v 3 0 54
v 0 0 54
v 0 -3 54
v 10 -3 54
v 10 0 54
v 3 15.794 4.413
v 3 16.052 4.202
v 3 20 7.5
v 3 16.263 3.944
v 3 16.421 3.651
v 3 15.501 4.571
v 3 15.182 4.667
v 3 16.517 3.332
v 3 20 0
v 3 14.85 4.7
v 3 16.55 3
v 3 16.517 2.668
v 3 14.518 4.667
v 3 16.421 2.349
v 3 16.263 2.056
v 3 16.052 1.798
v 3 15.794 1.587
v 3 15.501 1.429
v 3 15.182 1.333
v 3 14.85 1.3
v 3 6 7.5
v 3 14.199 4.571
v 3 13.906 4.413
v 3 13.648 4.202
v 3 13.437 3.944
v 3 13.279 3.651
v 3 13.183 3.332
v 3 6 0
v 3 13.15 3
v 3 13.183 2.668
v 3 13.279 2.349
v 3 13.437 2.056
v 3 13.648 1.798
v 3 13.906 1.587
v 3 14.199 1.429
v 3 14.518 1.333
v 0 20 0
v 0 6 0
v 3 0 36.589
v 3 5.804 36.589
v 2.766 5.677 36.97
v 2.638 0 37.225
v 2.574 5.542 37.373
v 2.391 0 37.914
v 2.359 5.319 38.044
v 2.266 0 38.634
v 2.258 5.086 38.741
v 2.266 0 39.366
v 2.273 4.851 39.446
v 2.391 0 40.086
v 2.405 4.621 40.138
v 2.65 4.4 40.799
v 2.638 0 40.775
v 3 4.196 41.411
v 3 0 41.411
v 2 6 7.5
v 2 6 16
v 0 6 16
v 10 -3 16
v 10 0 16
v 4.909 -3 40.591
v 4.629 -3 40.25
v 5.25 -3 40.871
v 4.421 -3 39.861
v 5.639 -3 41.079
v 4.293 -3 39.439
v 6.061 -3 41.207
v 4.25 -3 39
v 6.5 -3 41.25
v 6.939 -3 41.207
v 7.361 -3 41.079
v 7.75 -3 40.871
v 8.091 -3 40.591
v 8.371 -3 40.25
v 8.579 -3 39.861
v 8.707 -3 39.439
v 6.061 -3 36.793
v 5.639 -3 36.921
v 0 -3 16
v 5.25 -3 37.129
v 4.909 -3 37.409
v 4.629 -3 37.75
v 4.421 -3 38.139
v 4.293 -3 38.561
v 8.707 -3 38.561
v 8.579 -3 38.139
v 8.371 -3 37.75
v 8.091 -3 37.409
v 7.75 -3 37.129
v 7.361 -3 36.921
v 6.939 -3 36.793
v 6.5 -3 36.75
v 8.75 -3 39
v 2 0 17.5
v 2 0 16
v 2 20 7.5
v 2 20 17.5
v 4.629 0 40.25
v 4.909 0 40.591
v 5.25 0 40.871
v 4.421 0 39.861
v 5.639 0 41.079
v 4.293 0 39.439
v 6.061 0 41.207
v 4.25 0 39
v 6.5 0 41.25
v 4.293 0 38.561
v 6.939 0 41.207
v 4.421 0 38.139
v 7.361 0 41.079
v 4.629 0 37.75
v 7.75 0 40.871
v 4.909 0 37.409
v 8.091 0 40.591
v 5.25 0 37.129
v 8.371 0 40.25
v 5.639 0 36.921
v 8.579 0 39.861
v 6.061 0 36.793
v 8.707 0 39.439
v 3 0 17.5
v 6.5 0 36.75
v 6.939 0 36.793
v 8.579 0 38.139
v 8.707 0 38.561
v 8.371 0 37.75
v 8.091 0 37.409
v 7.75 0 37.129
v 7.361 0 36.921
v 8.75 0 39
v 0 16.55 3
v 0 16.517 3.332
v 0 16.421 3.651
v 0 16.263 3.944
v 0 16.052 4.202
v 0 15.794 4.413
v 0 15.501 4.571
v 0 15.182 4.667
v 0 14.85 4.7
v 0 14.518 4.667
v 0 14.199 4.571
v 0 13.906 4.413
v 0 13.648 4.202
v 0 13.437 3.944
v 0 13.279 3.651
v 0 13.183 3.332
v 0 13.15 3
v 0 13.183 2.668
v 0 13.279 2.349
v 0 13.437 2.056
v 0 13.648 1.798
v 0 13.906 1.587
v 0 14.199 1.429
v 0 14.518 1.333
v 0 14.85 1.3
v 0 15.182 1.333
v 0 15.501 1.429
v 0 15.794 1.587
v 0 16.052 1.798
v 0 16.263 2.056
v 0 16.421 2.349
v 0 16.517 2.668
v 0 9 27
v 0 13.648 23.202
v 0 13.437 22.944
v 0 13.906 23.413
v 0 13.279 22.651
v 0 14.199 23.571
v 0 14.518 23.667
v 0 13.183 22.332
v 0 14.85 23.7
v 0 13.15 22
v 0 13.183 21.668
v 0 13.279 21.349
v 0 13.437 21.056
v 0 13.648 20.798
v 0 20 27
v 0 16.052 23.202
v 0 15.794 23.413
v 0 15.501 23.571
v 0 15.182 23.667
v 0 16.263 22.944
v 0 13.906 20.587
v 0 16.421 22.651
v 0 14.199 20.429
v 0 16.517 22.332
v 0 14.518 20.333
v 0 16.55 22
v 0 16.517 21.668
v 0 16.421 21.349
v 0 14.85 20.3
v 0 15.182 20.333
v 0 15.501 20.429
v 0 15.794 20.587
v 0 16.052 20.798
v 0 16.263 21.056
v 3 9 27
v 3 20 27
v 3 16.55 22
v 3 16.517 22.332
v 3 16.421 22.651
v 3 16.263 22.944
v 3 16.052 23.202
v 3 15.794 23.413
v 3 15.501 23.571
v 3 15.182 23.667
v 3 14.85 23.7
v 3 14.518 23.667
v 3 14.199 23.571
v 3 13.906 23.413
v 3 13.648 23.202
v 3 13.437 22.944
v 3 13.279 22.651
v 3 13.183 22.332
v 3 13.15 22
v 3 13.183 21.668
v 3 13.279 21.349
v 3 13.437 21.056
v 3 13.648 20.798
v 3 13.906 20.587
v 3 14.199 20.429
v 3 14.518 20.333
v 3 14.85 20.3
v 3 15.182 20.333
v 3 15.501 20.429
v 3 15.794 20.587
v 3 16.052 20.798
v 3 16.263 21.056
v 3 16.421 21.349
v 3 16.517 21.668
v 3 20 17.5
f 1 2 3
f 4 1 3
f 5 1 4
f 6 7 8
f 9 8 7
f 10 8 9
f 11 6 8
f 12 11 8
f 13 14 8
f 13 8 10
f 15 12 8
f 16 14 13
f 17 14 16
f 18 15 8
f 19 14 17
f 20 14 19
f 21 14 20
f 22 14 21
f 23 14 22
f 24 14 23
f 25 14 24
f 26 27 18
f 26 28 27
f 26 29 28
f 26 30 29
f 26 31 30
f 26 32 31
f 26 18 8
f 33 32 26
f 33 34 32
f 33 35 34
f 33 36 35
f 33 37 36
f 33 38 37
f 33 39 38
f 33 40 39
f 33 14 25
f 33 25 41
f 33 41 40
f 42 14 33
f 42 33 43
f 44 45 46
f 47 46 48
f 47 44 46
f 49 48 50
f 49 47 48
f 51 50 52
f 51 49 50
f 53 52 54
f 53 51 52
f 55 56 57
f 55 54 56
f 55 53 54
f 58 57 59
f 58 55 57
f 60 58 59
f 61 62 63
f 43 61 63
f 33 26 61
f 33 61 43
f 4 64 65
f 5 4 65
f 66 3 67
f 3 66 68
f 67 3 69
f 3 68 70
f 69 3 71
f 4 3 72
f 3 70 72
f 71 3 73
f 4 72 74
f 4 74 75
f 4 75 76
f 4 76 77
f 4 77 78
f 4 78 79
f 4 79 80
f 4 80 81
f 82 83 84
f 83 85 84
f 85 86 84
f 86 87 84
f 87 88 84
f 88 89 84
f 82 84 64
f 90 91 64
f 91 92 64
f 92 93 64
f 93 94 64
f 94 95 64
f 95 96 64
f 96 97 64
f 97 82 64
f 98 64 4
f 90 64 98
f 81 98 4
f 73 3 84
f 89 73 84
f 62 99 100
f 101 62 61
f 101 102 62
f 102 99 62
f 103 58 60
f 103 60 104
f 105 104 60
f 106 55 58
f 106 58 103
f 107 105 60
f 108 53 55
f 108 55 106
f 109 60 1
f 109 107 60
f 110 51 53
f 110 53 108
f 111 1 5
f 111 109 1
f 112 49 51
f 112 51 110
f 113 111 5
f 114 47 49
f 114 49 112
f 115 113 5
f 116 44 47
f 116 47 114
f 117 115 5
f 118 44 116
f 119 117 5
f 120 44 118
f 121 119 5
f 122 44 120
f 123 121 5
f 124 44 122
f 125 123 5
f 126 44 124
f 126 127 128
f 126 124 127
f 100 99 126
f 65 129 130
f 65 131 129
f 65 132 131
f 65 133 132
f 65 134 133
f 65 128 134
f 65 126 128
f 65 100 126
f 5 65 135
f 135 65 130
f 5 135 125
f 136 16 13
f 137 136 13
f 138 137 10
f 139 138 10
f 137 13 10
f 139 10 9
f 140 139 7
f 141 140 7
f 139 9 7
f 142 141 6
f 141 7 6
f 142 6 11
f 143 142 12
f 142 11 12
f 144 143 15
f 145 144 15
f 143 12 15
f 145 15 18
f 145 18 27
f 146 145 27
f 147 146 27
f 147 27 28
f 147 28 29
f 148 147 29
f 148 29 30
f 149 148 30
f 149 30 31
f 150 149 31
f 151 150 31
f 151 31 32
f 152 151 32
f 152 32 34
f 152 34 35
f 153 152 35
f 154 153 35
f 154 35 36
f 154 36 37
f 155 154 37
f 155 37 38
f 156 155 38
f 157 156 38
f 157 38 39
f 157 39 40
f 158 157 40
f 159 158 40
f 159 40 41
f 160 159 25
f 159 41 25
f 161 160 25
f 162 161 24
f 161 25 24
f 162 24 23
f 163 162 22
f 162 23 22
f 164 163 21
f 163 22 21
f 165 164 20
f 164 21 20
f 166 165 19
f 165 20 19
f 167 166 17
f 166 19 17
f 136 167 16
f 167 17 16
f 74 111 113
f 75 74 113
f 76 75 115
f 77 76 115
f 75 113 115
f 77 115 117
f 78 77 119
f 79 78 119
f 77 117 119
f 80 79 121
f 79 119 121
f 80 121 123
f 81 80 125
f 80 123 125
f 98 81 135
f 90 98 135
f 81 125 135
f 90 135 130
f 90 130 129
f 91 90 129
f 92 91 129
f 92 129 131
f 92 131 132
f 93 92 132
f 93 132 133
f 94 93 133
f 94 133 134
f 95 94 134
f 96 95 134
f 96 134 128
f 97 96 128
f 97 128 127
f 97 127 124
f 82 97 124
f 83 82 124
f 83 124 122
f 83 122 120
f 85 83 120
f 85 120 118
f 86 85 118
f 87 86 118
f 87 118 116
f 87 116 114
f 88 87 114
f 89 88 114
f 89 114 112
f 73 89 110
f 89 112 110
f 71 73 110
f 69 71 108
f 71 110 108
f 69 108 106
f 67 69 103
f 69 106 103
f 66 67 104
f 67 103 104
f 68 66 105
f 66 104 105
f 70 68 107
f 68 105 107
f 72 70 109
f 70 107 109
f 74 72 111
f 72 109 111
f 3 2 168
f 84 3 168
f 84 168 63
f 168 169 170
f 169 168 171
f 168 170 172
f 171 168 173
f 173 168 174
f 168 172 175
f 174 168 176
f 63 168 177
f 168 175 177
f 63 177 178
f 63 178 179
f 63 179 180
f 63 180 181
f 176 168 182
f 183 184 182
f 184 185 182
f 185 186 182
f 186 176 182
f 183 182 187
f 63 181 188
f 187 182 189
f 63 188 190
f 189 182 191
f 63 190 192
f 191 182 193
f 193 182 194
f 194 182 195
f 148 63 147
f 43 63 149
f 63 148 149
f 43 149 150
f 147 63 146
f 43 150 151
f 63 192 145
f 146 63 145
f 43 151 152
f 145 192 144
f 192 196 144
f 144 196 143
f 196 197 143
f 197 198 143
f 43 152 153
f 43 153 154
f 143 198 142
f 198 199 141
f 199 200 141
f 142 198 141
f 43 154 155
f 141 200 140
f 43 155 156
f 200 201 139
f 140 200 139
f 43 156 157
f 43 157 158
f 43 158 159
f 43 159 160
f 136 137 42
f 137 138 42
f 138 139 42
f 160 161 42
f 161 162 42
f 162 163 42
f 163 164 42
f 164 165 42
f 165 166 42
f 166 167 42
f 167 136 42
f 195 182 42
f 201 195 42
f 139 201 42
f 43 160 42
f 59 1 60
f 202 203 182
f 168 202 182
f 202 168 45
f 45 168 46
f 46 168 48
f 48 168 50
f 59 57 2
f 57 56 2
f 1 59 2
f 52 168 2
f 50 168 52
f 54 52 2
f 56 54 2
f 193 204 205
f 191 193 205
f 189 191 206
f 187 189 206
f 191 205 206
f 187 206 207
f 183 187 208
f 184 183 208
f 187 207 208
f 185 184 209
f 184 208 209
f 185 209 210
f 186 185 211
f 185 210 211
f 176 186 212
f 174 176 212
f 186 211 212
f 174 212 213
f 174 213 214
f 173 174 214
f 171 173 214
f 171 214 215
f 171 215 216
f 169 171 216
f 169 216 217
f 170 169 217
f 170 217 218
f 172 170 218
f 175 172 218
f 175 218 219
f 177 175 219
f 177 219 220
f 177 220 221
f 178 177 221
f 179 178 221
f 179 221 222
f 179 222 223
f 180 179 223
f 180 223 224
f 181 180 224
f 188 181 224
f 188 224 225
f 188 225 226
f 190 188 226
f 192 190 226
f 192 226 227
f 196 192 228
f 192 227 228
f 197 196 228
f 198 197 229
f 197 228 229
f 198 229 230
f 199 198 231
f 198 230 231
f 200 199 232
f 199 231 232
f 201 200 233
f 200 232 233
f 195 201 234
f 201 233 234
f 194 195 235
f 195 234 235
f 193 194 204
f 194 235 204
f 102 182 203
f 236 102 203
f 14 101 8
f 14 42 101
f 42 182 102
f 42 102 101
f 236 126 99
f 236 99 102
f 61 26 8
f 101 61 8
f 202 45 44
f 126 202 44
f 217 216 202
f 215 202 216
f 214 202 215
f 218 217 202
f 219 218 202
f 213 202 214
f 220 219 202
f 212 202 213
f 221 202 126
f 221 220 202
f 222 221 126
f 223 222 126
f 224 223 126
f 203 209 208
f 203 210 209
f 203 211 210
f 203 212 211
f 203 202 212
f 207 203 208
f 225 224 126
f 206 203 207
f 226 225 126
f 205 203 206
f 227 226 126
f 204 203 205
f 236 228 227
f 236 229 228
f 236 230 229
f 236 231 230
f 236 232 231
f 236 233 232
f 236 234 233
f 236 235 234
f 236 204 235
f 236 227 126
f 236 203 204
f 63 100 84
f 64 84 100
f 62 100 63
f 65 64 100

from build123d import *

# Parameters (mm, degrees)
BOSS_EXTRUDE1_DEPTH = 27
SKETCH3_R           = 1.7
CUT_EXTRUDE2_DEPTH  = 35.322004603
SKETCH4_W           = 10
SKETCH4_H           = 20
CUT_EXTRUDE3_DEPTH  = 1
SKETCH5_R           = 2.25
CUT_EXTRUDE4_DEPTH  = 36.057096286
BOSS_EXTRUDE2_DEPTH = 3
SKETCH7_W           = 7
SKETCH7_H           = 3
BOSS_EXTRUDE3_DEPTH = 27
SKETCH8_R           = 2.25
CUT_EXTRUDE5_DEPTH  = 59.446556785
SKETCH9_R           = 4.25
CUT_EXTRUDE6_DEPTH  = 59.446556785
SKETCH11_W          = 16
SKETCH11_H          = 9
CUT_EXTRUDE7_DEPTH  = 59.446556785


with BuildPart() as part:
    # Sketch1 → Boss-Extrude1 (new body)
    with BuildSketch(Plane.XY):
        Polygon((0, 0), (0, 20), (3, 20), (3, 0), (10, 0), (10, -3), (0, -3), align=None)
    extrude(amount=BOSS_EXTRUDE1_DEPTH)

    # Sketch3 → Cut-Extrude2 (cut, through all)
    with BuildSketch(Plane(origin=(3, 0, 0), x_dir=(0, 0, -1), z_dir=(1, 0, 0))):
        with Locations(Location((-22, 14.85, 0), (0, 0, 90))):
            Circle(SKETCH3_R)
        with Locations(Location((-3, 14.85, 0), (0, 0, 90))):
            Circle(SKETCH3_R)
    extrude(amount=-CUT_EXTRUDE2_DEPTH, mode=Mode.SUBTRACT)

    # Sketch4 → Cut-Extrude3 (cut)
    with BuildSketch(Plane(origin=(3, 0, 0), x_dir=(0, 0, -1), z_dir=(1, 0, 0))):
        with Locations((-12.5, 10)):
            Rectangle(SKETCH4_W, SKETCH4_H)
    extrude(amount=-CUT_EXTRUDE3_DEPTH, mode=Mode.SUBTRACT)

    # Sketch5 → Cut-Extrude4 (cut, through all)
    with BuildSketch(Plane(origin=(0, 0, 0), x_dir=(1, 0, 0), z_dir=(0, 1, 0))):
        with Locations(Location((6.5, -9, 0), (0, 0, 270))):
            Circle(SKETCH5_R)
    extrude(amount=-CUT_EXTRUDE4_DEPTH, mode=Mode.SUBTRACT)

    # Sketch6 → Boss-Extrude2 (add)
    with BuildSketch(Plane.ZY):
        Polygon((27, 9), (54, 0), (54, -3), (27, -3), align=None)
    extrude(amount=-BOSS_EXTRUDE2_DEPTH)

    # Sketch7 → Boss-Extrude3 (add)
    with BuildSketch(Plane.XY.offset(27)):
        with Locations((6.5, -1.5)):
            Rectangle(SKETCH7_W, SKETCH7_H)
    extrude(amount=BOSS_EXTRUDE3_DEPTH)

    # Sketch8 → Cut-Extrude5 (cut, through all)
    with BuildSketch(Plane(origin=(0, 0, 0), x_dir=(1, 0, 0), z_dir=(0, 1, 0))):
        with Locations(Location((6.5, -39, 0), (0, 0, 270))):
            Circle(SKETCH8_R)
    extrude(amount=-CUT_EXTRUDE5_DEPTH, mode=Mode.SUBTRACT)

    # Sketch9 → Cut-Extrude6 (cut, through all)
    with BuildSketch(Plane(origin=(0, 0, 0), x_dir=(1, 0, 0), z_dir=(0, 1, 0))):
        with Locations((6.5, -39)):
            Circle(SKETCH9_R)
    extrude(amount=CUT_EXTRUDE6_DEPTH, mode=Mode.SUBTRACT)

    # Sketch11 → Cut-Extrude7 (cut, through all)
    with BuildSketch(Plane(origin=(10, 0, 0), x_dir=(0, 0, -1), z_dir=(1, 0, 0))):
        with Locations((-8, 1.5)):
            Rectangle(SKETCH11_W, SKETCH11_H)
    extrude(amount=-CUT_EXTRUDE7_DEPTH, mode=Mode.SUBTRACT)


solid = part.part
